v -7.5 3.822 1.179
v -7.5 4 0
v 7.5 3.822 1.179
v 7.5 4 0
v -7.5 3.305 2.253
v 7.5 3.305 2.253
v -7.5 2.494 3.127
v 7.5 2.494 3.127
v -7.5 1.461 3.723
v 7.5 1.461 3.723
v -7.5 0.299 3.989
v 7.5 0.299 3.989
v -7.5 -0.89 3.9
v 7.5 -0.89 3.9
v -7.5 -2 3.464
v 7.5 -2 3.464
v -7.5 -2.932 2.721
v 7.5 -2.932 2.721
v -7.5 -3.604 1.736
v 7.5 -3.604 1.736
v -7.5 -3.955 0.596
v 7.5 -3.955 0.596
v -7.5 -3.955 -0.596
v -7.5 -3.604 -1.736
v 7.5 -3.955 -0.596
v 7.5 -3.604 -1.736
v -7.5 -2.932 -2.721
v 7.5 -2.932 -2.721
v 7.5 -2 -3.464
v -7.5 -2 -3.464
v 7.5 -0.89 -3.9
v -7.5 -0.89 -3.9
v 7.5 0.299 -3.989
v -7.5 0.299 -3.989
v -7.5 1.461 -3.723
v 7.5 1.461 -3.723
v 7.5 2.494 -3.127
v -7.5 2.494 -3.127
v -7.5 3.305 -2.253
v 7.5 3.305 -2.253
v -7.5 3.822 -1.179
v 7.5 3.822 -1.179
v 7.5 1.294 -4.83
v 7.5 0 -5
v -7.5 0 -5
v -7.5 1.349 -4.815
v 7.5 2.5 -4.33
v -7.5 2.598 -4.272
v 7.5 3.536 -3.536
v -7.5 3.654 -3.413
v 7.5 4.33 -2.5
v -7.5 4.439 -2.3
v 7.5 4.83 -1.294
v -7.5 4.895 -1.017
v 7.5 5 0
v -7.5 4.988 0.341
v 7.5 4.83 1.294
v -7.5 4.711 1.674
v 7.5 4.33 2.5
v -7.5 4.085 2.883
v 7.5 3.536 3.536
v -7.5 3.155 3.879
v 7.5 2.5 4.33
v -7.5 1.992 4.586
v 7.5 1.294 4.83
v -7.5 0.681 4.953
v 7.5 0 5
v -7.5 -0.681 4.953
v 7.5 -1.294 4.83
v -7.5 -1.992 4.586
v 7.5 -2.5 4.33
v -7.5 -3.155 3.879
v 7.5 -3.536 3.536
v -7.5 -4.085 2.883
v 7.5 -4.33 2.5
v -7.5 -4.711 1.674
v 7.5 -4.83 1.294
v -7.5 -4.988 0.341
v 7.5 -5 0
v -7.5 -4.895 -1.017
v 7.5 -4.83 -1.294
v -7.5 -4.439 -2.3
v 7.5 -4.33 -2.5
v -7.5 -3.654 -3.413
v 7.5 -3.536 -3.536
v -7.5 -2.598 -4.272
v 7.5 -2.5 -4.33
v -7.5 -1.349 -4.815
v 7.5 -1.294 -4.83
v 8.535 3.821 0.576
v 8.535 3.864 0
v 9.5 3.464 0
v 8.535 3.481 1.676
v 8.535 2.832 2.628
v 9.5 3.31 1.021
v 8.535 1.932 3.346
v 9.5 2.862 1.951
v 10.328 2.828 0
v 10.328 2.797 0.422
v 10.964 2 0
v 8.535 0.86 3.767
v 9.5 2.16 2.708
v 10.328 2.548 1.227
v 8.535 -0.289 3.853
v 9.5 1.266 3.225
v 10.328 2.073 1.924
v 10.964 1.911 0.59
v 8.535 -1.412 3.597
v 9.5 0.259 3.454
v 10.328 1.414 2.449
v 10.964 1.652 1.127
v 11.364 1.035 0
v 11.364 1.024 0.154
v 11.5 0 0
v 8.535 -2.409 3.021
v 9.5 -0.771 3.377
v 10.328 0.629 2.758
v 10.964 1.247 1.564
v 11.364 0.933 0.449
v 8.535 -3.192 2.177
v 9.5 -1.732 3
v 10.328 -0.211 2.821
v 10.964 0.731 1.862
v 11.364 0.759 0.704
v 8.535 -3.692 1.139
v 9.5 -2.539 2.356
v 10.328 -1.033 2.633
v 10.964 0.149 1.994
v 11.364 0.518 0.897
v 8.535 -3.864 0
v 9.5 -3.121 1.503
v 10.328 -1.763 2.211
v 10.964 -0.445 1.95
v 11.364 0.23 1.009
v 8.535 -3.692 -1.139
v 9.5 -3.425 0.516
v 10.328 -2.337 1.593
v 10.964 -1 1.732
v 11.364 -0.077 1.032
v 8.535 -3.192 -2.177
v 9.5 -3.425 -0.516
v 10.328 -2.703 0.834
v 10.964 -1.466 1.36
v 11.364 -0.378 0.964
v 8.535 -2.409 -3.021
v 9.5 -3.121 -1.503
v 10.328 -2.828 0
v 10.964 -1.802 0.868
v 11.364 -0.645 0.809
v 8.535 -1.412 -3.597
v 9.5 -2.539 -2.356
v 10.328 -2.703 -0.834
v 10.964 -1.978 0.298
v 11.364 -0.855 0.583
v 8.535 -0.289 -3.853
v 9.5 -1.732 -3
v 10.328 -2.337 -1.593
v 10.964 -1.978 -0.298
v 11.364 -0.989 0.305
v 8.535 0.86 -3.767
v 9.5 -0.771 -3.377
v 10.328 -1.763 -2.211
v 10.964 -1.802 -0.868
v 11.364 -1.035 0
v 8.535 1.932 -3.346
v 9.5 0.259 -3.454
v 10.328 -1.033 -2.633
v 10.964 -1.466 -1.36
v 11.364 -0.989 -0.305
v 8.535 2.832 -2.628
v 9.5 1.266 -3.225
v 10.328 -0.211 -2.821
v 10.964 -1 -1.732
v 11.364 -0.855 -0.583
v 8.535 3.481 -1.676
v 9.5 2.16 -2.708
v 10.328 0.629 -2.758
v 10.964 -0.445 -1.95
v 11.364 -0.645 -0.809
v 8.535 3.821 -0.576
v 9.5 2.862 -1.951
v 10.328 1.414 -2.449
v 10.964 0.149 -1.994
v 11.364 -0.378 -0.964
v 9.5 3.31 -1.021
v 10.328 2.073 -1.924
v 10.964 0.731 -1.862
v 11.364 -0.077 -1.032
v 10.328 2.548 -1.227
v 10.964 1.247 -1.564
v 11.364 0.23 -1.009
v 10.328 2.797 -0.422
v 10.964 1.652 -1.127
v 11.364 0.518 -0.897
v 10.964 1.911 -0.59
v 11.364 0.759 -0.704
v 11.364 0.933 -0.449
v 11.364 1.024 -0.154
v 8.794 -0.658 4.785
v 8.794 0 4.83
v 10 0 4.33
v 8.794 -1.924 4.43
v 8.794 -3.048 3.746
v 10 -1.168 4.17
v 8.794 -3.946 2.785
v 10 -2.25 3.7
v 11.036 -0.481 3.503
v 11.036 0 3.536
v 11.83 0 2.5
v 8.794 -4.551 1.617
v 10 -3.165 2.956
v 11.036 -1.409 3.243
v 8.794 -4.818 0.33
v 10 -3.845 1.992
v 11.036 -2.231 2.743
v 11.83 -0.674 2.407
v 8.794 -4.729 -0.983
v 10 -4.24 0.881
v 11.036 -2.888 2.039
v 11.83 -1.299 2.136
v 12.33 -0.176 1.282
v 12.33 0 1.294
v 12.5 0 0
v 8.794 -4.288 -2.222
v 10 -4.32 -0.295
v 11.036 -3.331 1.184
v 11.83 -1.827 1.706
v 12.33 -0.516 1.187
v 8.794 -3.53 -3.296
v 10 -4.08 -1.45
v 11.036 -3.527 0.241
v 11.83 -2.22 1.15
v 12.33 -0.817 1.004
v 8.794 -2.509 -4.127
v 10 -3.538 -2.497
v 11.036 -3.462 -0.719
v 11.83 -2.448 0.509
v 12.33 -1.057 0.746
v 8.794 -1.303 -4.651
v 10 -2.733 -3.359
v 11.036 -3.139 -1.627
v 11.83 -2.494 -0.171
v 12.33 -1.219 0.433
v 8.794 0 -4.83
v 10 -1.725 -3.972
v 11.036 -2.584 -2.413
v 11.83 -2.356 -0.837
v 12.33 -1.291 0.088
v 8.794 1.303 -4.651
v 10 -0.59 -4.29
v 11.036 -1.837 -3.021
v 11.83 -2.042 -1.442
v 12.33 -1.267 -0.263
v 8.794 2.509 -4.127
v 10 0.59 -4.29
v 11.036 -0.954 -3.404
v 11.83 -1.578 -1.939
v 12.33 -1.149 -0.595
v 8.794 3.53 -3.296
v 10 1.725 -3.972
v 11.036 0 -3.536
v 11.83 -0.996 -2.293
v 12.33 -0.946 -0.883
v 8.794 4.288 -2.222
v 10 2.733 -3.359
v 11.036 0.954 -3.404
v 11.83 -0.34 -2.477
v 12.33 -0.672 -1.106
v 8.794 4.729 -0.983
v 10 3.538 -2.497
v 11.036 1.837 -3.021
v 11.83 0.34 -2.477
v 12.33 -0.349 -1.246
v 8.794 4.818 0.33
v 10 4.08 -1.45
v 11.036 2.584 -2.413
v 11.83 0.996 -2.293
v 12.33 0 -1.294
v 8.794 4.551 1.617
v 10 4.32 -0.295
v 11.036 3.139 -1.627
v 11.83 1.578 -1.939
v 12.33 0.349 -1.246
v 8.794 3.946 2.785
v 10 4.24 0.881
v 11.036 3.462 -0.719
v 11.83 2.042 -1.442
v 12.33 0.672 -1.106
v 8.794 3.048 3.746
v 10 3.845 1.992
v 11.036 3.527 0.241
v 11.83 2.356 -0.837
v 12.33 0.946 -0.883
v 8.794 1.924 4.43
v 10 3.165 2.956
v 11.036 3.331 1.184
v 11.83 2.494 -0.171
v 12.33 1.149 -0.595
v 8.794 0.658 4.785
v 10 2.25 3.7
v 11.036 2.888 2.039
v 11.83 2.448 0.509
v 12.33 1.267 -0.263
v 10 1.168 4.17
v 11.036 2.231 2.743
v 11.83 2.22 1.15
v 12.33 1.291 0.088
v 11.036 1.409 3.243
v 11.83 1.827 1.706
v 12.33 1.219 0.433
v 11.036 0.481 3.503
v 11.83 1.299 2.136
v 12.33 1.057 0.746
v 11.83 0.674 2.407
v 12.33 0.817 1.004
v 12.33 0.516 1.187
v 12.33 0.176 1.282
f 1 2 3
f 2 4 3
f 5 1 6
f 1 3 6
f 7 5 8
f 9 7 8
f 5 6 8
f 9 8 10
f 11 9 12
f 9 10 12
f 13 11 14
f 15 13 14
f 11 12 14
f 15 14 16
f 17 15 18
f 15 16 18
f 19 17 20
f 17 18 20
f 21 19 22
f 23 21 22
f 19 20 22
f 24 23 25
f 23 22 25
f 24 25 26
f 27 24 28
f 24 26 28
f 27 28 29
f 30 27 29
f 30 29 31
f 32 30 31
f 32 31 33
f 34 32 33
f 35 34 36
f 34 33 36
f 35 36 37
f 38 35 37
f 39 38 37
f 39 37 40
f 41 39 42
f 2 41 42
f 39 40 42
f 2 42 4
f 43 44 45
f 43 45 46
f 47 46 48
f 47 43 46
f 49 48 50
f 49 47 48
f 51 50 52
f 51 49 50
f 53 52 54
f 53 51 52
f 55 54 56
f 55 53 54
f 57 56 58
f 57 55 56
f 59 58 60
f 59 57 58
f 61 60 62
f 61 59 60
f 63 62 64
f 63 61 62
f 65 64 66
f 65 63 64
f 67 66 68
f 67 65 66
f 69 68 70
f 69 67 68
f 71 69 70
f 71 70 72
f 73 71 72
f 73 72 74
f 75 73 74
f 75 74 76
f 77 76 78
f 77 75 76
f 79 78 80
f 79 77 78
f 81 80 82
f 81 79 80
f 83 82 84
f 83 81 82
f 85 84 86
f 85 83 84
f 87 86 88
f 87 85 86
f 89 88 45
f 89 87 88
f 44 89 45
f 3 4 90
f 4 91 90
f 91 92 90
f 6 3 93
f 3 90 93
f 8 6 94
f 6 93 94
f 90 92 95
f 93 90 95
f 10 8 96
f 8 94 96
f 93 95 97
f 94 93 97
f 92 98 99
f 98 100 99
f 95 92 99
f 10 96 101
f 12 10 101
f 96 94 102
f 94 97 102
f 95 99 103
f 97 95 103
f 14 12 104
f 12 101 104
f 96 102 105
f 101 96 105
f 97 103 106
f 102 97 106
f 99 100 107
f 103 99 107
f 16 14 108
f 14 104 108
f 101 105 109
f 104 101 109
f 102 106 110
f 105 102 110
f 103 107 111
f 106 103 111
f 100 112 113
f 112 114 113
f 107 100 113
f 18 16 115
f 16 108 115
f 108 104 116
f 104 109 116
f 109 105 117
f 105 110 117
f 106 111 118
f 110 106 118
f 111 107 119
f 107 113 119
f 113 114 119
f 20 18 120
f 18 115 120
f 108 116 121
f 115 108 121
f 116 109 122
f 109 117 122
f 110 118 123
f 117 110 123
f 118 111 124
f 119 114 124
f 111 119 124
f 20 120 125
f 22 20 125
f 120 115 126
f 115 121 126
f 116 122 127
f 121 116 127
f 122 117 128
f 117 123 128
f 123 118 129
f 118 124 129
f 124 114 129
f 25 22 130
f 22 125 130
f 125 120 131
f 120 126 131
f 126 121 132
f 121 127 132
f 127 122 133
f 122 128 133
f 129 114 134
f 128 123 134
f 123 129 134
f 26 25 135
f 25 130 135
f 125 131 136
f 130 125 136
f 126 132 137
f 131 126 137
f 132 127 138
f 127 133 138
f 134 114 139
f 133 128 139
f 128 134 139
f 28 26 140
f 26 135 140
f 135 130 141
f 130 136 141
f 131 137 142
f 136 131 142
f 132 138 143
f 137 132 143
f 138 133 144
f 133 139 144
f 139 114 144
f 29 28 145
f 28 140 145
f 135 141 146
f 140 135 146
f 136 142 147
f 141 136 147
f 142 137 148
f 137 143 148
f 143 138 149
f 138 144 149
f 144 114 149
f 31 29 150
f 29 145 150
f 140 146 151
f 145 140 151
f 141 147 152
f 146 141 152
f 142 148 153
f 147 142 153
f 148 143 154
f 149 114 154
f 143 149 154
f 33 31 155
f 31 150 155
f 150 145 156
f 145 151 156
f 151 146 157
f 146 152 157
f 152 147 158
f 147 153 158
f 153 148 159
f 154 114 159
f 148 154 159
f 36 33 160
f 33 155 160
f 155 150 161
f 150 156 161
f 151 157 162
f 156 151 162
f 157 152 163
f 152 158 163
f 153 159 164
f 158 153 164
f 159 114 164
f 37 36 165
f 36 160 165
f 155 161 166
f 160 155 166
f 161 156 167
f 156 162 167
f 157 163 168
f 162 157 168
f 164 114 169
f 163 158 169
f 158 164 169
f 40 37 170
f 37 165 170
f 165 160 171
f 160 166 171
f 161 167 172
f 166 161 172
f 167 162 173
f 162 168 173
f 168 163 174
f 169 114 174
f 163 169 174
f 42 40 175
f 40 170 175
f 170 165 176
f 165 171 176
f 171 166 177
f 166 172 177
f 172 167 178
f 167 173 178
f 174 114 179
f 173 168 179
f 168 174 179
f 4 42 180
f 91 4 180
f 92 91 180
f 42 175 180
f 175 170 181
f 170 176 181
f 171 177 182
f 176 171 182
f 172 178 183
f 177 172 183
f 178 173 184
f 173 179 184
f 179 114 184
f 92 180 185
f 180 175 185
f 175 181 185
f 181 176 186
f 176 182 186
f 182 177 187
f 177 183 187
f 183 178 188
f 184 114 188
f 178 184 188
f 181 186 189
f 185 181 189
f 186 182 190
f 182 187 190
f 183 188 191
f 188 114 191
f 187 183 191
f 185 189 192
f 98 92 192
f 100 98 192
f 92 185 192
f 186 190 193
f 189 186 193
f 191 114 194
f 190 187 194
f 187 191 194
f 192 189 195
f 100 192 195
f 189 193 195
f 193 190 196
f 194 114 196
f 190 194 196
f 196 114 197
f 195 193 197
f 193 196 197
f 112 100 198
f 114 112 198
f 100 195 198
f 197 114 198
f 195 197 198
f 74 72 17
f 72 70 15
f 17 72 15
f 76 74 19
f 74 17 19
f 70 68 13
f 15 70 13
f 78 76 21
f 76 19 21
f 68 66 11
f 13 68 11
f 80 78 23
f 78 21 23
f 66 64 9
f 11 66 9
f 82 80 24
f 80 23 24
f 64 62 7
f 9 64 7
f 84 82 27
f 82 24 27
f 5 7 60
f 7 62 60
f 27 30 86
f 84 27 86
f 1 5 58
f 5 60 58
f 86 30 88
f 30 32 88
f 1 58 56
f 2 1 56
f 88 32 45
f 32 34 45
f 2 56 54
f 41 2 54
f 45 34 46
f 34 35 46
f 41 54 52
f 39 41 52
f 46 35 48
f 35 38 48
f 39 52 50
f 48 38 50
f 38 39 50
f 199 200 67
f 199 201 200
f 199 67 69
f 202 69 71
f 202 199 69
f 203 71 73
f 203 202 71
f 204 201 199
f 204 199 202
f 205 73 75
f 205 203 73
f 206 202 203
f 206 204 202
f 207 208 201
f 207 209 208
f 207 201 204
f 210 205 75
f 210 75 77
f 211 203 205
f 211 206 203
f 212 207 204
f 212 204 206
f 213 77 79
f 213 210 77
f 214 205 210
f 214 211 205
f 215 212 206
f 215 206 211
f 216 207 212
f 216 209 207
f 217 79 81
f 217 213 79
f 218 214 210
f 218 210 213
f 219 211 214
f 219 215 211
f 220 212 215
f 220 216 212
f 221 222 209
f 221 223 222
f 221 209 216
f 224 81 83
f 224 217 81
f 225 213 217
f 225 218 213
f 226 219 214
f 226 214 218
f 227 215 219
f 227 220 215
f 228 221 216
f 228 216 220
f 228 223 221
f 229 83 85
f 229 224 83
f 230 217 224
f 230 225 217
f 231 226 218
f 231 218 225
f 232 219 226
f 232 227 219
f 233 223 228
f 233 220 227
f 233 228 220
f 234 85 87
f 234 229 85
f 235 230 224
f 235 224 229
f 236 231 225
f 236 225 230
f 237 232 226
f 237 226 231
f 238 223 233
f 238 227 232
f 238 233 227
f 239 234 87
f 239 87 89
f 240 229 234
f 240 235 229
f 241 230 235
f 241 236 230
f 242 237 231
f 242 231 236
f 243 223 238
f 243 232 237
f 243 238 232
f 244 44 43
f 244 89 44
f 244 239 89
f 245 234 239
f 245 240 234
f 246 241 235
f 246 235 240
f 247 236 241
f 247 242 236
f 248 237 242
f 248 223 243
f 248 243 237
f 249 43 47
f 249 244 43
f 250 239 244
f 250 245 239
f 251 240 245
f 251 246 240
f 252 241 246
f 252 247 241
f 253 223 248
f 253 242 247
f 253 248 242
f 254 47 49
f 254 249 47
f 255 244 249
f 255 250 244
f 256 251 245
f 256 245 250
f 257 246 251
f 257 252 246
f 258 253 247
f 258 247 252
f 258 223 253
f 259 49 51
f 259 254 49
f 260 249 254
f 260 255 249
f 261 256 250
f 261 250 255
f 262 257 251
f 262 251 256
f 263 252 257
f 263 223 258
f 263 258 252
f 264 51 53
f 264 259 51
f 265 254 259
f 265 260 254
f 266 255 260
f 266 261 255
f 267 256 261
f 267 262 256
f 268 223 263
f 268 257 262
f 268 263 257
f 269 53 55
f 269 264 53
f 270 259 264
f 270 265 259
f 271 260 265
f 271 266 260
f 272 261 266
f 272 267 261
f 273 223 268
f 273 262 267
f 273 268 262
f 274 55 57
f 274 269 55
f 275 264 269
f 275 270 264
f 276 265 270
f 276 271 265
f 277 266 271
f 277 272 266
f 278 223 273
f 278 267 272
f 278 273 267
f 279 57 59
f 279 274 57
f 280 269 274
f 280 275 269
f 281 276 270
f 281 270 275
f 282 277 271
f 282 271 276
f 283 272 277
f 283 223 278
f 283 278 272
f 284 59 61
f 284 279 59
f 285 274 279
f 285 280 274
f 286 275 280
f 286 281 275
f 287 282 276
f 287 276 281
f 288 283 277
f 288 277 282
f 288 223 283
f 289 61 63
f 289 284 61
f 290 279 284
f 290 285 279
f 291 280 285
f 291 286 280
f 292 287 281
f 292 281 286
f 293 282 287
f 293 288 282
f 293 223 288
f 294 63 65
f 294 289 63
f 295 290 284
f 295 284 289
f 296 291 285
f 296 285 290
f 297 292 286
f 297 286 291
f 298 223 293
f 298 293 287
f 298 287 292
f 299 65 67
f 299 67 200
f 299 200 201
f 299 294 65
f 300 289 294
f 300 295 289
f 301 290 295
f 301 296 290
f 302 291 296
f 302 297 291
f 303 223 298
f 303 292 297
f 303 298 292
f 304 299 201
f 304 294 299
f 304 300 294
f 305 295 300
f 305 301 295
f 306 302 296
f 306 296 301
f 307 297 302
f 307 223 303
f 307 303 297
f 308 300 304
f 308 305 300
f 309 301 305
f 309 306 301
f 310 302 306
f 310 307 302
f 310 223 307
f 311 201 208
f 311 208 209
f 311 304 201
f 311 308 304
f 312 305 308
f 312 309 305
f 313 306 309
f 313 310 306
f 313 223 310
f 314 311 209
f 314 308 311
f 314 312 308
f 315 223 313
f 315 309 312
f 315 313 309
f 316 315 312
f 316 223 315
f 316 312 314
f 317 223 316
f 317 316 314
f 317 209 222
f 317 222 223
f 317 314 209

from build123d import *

# Parameters (mm, degrees)
SKETCH1_R           = 5
BOSS_EXTRUDE1_DEPTH = 7.5
DOME1_FACE_RADIUS   = 5
DOME1_HEIGHT        = 5


# Read off the part's stored shape, not the designer's step: Shell1
with BuildPart() as part:
    # Sketch1 → Boss-Extrude1 (new, symmetric)
    with BuildSketch(Plane(origin=(0, 0, 0), x_dir=(0, 0, -1), z_dir=(1, 0, 0))):
        Circle(SKETCH1_R)
    extrude(amount=BOSS_EXTRUDE1_DEPTH, both=True)

    # Dome1: a dome of height H over a round flat face of radius A is a cap of a sphere of radius (A * A + H * H) / (2 * H)
    dome1_r = (DOME1_FACE_RADIUS * DOME1_FACE_RADIUS + DOME1_HEIGHT * DOME1_HEIGHT) / (2 * DOME1_HEIGHT)
    dome1_base = Plane((7.5, 0, 0), z_dir=(1, 0, 0))
    with Locations(dome1_base.offset(DOME1_HEIGHT - dome1_r)):
        dome1_ball = Sphere(dome1_r, mode=Mode.PRIVATE)
    add(split(dome1_ball, bisect_by=dome1_base, keep=Keep.TOP, mode=Mode.PRIVATE))

    # Shell1 outline → Shell1 (revolve, cut)
    with BuildSketch(Plane.YX):
        with BuildLine():
            Line((4, -7.5), (4, 7.499999996))
            ThreePointArc((4, 7.499999996), (2.828427126, 10.328427123), (0, 11.5))
            Line((0, 11.5), (0, -7.5))
            Line((0, -7.5), (4, -7.5))
        make_face()
    revolve(axis=Axis((0, 0, 0), (1, 0, 0)), mode=Mode.SUBTRACT)


solid = part.part
